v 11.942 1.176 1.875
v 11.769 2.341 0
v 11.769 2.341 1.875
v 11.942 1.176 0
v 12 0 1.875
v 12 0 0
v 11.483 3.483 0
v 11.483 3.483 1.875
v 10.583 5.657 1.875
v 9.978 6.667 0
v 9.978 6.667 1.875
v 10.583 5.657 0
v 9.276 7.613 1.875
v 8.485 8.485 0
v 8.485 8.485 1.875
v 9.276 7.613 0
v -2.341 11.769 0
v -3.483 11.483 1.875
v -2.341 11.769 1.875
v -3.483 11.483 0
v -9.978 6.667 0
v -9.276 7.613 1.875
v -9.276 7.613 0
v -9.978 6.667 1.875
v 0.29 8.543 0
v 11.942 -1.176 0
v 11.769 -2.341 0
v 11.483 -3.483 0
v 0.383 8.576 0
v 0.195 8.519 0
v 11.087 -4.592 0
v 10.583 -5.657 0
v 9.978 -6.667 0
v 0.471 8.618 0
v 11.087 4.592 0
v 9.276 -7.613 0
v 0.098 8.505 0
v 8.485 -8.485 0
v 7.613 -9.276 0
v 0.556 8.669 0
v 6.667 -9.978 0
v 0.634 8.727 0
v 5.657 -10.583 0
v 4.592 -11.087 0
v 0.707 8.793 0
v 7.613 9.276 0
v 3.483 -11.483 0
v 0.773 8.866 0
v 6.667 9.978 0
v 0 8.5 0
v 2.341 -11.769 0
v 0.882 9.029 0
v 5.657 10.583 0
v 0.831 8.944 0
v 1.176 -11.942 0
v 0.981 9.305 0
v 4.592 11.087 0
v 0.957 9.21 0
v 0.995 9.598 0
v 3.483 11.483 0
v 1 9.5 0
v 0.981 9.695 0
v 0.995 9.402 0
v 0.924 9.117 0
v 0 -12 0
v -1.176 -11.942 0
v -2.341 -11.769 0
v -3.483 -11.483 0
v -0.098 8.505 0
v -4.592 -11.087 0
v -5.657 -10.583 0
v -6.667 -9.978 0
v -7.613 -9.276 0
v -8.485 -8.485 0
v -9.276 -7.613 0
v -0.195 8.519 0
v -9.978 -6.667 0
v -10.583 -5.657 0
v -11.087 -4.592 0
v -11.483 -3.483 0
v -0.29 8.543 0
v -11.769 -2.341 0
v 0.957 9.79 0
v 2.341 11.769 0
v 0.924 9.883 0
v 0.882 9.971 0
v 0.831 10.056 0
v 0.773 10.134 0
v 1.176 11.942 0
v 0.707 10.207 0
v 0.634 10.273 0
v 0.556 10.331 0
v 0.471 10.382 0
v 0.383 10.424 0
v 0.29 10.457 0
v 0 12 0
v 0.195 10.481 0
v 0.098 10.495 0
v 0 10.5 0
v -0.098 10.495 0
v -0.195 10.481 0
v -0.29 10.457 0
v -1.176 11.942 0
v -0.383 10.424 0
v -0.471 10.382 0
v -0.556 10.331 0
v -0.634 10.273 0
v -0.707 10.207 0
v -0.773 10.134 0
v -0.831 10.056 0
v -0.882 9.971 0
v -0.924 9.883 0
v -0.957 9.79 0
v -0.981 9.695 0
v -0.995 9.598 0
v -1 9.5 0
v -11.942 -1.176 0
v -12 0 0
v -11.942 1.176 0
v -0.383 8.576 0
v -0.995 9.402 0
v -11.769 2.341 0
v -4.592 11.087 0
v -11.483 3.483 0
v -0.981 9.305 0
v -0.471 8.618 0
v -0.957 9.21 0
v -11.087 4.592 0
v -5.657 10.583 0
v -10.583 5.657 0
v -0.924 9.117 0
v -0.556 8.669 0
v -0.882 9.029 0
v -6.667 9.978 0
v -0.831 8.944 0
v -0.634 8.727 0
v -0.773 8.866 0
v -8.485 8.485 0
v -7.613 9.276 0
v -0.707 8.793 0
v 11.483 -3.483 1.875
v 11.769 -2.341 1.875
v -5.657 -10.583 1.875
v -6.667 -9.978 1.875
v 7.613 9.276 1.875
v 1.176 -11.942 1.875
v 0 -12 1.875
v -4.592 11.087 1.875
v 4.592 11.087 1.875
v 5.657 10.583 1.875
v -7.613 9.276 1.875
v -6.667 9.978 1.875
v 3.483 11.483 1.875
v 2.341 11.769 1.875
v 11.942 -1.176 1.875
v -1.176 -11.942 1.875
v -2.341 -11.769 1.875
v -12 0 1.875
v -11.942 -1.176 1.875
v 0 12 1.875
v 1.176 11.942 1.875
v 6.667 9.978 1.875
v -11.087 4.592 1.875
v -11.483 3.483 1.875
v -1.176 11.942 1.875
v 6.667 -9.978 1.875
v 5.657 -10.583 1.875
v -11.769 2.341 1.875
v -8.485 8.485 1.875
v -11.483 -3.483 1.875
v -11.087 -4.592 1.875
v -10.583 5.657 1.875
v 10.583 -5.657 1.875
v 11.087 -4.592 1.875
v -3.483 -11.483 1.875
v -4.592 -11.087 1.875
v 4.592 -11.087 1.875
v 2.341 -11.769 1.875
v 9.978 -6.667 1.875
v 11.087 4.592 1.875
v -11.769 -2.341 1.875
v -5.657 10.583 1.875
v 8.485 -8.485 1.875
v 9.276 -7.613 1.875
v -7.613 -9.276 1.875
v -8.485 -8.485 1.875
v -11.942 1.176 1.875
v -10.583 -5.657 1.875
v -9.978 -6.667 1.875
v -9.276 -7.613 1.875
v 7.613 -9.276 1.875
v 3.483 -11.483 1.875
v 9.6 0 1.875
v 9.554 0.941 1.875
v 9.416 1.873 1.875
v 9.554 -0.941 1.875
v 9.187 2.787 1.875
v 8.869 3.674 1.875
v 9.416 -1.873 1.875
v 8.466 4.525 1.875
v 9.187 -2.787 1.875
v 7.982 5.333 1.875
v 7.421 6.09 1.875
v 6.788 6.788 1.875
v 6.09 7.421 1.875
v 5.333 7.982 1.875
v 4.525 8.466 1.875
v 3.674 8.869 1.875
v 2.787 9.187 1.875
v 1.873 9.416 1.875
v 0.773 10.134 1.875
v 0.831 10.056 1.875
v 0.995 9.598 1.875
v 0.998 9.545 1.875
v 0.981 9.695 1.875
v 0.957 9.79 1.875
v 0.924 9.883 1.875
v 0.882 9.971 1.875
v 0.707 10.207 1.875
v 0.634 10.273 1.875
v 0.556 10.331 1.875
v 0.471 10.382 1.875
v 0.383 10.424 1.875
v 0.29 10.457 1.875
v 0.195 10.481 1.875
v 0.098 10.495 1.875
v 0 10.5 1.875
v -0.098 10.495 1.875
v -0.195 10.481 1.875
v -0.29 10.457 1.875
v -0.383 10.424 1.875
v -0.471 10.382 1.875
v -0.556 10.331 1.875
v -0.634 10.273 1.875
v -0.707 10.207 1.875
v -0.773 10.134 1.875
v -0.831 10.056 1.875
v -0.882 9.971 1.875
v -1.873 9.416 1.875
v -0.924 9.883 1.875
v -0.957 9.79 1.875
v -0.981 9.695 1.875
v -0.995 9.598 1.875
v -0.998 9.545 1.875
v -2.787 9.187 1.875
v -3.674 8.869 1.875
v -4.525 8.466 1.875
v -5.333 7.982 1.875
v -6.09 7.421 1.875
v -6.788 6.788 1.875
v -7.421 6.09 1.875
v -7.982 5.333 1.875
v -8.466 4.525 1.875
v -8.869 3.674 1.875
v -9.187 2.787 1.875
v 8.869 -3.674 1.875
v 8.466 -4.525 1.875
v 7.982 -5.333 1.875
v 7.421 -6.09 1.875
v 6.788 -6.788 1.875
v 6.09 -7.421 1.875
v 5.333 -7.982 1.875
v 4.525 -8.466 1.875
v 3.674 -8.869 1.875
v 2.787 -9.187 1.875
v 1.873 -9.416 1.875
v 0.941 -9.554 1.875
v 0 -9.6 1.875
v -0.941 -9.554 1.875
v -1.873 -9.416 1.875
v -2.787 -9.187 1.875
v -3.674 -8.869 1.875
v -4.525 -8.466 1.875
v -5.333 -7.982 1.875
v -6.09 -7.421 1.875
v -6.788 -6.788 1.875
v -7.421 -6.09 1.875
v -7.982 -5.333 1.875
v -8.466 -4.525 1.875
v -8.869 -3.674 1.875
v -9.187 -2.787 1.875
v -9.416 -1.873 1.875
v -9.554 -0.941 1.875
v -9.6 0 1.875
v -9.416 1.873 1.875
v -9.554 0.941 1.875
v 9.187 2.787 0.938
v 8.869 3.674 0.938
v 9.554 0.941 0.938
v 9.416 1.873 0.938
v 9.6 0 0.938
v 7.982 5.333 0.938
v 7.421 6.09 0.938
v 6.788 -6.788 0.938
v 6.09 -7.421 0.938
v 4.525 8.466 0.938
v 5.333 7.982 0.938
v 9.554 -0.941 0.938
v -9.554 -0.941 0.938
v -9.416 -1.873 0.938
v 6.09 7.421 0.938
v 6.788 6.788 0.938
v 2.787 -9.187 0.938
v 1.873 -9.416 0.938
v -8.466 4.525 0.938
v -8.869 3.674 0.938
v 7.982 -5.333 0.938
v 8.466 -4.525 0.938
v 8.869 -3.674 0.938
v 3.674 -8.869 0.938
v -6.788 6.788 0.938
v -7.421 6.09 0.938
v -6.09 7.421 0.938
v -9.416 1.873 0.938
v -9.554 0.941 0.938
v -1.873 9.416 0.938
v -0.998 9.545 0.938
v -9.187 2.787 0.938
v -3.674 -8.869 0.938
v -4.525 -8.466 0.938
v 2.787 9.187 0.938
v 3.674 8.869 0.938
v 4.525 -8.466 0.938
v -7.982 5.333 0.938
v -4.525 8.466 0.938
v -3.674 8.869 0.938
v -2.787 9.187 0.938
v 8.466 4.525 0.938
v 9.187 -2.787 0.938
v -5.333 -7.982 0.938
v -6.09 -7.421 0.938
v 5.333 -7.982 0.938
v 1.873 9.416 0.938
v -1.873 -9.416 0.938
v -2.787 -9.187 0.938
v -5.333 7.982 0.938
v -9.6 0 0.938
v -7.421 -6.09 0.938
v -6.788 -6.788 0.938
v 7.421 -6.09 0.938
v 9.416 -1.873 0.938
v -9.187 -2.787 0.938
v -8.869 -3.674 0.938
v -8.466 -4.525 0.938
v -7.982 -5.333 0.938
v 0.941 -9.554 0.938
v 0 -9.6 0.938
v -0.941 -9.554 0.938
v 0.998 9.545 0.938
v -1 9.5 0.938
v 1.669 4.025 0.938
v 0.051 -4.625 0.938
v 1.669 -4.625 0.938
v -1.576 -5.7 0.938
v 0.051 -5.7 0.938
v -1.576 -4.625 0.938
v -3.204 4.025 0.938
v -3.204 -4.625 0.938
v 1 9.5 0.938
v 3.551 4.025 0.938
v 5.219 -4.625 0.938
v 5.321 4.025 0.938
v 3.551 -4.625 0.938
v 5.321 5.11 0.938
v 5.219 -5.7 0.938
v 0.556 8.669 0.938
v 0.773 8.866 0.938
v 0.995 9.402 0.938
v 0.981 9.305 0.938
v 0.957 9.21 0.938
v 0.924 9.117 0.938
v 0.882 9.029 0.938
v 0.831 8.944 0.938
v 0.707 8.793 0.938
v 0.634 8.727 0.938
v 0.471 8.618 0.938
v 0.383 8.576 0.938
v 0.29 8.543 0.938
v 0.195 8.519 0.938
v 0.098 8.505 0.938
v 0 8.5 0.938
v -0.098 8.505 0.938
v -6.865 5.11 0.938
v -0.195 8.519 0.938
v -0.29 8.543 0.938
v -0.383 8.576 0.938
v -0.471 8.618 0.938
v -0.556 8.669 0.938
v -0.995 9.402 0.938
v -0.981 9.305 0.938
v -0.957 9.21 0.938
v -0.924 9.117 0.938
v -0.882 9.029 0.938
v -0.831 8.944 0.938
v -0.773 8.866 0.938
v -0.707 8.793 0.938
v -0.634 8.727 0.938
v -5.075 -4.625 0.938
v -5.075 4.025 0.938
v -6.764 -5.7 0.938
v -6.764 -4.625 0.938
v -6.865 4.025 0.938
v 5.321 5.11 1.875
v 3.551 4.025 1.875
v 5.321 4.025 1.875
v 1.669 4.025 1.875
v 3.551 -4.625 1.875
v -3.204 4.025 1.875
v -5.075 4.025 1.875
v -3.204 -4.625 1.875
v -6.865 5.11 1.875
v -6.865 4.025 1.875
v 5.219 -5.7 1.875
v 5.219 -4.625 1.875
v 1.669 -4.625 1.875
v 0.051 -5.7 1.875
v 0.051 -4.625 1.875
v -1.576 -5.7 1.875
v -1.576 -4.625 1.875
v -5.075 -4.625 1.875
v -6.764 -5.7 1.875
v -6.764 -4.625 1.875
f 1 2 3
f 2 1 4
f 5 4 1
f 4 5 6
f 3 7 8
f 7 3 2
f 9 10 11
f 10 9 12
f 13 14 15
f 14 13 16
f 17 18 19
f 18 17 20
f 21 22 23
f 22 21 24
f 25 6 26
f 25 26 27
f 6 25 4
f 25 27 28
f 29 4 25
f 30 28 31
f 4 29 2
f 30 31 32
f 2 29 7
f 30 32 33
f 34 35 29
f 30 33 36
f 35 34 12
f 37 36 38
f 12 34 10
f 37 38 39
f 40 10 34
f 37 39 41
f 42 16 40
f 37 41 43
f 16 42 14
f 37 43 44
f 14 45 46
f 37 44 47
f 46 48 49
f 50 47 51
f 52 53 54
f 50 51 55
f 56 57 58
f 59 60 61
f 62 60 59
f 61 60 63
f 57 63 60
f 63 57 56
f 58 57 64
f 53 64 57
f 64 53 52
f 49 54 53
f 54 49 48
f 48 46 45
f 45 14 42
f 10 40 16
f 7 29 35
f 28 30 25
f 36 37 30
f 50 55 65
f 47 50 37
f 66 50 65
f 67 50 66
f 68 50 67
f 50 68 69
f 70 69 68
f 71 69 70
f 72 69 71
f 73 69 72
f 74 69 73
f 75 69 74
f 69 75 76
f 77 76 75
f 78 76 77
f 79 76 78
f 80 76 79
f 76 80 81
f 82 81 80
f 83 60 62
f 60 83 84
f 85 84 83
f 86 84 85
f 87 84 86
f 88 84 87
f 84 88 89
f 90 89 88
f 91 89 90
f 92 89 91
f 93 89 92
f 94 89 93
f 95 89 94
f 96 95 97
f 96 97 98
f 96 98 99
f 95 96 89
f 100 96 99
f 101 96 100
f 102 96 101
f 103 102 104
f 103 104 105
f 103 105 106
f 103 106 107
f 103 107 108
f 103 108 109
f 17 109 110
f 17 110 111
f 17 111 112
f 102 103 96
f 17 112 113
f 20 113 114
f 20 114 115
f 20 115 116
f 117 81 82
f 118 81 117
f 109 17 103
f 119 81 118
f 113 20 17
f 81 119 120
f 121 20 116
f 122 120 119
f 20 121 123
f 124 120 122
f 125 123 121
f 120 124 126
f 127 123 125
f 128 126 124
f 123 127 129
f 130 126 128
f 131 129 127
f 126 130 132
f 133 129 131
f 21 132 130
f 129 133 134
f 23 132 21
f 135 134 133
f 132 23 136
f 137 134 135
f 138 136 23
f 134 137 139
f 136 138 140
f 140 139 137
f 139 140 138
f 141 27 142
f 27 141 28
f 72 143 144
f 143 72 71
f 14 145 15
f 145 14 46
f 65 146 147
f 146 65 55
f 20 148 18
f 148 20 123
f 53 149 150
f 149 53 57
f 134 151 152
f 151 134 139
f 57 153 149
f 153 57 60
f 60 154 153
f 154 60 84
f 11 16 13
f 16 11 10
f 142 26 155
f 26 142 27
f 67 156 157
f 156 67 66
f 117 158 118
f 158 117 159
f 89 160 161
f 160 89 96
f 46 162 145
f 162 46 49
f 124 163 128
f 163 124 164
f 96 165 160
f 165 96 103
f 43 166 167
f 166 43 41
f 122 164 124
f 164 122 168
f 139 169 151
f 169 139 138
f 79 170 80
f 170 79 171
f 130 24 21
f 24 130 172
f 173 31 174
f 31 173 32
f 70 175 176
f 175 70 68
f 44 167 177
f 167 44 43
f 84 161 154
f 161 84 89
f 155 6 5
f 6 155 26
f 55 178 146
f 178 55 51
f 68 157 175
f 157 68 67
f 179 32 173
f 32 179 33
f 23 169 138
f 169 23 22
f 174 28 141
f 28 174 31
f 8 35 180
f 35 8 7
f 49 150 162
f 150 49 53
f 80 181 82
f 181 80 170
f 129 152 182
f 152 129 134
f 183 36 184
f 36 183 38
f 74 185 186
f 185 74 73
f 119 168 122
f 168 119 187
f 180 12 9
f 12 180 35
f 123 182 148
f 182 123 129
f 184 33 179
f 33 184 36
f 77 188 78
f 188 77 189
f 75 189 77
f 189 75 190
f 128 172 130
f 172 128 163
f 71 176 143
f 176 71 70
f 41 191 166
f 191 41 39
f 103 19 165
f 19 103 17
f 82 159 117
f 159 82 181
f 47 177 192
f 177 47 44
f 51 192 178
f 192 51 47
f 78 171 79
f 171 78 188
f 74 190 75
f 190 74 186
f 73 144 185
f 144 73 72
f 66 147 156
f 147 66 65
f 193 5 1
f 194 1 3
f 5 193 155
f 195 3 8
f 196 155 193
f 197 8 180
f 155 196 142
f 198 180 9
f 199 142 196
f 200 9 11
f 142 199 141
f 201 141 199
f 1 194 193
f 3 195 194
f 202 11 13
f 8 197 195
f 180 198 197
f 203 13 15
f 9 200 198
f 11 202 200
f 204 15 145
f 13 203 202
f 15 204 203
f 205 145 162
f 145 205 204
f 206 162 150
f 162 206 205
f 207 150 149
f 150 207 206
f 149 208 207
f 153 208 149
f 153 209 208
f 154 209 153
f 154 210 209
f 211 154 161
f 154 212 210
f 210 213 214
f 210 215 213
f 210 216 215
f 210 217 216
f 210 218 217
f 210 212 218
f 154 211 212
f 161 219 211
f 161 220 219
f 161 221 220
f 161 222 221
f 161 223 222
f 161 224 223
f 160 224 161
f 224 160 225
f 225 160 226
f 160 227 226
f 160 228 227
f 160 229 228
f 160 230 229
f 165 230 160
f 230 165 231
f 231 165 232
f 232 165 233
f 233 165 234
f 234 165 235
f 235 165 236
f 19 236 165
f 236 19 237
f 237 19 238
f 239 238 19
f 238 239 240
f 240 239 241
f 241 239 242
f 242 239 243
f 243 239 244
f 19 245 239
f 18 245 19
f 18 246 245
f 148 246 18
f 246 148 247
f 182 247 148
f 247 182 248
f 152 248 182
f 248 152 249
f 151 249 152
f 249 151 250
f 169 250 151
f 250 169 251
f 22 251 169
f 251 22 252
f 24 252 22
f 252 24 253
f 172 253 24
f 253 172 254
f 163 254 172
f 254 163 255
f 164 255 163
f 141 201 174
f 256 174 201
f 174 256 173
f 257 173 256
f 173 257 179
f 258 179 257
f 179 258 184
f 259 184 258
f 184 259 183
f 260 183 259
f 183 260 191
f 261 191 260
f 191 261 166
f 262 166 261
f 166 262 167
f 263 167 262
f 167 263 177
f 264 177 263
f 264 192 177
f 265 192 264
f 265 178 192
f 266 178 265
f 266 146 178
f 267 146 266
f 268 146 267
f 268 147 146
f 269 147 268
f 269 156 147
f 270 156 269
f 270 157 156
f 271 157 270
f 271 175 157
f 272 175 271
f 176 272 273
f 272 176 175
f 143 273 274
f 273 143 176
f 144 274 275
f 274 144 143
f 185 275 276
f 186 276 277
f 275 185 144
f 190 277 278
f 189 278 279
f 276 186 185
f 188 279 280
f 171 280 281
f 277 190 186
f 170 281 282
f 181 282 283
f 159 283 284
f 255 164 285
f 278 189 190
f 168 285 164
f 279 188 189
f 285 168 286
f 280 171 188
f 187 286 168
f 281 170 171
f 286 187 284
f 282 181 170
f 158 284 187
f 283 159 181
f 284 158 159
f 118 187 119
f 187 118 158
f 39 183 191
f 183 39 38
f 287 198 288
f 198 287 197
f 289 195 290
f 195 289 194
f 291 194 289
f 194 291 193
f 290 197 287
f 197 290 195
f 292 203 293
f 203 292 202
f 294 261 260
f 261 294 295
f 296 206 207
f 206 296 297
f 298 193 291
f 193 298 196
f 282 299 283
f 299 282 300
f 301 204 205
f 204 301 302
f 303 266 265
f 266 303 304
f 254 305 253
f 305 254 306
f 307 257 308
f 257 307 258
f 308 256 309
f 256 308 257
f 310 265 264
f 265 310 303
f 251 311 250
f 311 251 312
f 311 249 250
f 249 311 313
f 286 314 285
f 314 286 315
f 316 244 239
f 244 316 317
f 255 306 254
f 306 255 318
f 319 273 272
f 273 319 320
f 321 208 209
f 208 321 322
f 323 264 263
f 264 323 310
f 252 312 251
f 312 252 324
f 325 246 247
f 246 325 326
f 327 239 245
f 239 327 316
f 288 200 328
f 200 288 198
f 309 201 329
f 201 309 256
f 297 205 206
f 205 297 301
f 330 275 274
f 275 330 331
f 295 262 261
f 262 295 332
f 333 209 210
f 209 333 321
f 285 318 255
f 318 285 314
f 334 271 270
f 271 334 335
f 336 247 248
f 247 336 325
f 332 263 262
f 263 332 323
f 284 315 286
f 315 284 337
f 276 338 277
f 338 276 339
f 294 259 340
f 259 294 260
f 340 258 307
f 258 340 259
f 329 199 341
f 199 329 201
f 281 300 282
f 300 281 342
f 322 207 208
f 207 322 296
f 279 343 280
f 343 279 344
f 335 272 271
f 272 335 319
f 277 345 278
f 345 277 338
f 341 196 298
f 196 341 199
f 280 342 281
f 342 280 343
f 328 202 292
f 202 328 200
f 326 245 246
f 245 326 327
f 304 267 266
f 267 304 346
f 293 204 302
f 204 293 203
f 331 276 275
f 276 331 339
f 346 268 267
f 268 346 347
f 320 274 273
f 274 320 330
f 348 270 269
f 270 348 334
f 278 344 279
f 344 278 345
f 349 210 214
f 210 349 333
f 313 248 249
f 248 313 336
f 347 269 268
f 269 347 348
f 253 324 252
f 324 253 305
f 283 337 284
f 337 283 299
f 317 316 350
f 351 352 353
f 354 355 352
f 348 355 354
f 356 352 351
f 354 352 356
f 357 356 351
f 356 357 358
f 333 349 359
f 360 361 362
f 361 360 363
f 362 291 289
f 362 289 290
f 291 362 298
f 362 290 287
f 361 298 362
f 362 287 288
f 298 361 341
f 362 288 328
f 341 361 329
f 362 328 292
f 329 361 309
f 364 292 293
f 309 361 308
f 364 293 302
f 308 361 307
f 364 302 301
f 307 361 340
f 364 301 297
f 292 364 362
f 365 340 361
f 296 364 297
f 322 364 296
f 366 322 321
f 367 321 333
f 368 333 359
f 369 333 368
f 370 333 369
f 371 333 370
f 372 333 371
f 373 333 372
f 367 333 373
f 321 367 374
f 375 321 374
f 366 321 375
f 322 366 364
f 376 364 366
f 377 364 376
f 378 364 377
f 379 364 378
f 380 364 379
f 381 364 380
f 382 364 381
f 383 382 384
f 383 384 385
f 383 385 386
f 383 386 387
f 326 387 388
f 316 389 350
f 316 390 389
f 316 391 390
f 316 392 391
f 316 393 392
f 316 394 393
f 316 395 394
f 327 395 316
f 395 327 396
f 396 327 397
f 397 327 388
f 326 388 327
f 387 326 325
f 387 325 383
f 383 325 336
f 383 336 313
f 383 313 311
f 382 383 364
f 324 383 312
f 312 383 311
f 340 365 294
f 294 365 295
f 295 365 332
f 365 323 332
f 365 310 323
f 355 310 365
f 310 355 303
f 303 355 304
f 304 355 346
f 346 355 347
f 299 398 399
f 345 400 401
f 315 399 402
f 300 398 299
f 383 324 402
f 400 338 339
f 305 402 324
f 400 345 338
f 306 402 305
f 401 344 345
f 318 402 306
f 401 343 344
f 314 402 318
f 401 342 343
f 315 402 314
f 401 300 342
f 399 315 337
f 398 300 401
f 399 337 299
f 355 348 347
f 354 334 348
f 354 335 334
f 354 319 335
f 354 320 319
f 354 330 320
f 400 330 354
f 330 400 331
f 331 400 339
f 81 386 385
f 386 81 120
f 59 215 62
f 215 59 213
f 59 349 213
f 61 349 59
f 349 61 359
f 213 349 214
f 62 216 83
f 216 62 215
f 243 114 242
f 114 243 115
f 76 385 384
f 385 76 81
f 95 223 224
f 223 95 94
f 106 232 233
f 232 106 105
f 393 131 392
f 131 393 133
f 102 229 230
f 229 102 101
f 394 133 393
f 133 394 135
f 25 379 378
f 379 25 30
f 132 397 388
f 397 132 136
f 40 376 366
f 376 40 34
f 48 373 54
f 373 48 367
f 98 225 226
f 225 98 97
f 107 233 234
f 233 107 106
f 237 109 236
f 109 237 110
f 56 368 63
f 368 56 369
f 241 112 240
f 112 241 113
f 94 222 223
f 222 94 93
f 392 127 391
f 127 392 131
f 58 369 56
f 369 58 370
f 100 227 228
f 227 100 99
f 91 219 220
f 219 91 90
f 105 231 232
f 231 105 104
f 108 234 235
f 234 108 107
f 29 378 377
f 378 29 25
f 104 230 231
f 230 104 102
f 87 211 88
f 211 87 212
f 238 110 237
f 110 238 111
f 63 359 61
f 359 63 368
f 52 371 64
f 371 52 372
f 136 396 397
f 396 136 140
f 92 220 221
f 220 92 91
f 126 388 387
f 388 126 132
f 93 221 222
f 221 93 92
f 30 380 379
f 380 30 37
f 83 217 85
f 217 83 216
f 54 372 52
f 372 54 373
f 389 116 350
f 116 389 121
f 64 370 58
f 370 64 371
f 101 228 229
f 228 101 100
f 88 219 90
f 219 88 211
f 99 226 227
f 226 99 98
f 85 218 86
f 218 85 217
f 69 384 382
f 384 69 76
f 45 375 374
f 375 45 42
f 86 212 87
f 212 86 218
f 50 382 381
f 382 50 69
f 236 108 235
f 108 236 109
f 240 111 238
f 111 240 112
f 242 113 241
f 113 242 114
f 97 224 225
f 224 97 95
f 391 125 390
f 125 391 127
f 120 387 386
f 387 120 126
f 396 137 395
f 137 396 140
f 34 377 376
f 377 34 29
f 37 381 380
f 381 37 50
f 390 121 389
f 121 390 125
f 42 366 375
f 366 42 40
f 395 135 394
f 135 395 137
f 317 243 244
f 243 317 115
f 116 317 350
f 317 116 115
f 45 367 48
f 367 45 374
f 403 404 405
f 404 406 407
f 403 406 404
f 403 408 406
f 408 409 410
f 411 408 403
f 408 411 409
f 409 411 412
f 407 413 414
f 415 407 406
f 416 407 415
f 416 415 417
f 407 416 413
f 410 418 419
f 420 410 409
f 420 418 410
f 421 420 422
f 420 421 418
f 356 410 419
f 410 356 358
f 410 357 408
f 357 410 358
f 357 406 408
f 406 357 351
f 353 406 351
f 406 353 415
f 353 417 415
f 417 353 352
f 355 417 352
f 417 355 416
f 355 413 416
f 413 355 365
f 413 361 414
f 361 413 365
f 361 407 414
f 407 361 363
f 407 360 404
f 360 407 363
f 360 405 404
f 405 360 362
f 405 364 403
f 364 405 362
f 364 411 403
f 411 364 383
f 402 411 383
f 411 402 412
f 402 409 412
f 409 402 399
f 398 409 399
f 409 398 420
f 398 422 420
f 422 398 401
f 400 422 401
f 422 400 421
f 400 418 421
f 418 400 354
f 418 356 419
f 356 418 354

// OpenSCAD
$fn = 64;

size_index = 120;
button_radius = size_index/10;
rim_size = size_index/100;
internal_radius = button_radius - rim_size*2;
//button_height = 1.8;
button_height = size_index/64;
button_drop = button_height/2;
font_size = size_index/8;

text = "Align";
 
difference() {
    cylinder(r = button_radius, h = button_height);
    translate([0, 0, button_drop]) {
        cylinder(r = internal_radius, h = button_drop);
    }
    translate([0,9.5,0]) {
        cylinder(r = 1, h = button_height);
    }
}
content = "π";
//font = "Liberation Sans";
//font = "Comic Sans"; 
font = "Palatino";

translate ([-(font_size/2.2)-.8,-(font_size/2)+1.8,0]) {
   linear_extrude(height = button_height) {
       text(content, font = font, size = font_size);
     }
 }
